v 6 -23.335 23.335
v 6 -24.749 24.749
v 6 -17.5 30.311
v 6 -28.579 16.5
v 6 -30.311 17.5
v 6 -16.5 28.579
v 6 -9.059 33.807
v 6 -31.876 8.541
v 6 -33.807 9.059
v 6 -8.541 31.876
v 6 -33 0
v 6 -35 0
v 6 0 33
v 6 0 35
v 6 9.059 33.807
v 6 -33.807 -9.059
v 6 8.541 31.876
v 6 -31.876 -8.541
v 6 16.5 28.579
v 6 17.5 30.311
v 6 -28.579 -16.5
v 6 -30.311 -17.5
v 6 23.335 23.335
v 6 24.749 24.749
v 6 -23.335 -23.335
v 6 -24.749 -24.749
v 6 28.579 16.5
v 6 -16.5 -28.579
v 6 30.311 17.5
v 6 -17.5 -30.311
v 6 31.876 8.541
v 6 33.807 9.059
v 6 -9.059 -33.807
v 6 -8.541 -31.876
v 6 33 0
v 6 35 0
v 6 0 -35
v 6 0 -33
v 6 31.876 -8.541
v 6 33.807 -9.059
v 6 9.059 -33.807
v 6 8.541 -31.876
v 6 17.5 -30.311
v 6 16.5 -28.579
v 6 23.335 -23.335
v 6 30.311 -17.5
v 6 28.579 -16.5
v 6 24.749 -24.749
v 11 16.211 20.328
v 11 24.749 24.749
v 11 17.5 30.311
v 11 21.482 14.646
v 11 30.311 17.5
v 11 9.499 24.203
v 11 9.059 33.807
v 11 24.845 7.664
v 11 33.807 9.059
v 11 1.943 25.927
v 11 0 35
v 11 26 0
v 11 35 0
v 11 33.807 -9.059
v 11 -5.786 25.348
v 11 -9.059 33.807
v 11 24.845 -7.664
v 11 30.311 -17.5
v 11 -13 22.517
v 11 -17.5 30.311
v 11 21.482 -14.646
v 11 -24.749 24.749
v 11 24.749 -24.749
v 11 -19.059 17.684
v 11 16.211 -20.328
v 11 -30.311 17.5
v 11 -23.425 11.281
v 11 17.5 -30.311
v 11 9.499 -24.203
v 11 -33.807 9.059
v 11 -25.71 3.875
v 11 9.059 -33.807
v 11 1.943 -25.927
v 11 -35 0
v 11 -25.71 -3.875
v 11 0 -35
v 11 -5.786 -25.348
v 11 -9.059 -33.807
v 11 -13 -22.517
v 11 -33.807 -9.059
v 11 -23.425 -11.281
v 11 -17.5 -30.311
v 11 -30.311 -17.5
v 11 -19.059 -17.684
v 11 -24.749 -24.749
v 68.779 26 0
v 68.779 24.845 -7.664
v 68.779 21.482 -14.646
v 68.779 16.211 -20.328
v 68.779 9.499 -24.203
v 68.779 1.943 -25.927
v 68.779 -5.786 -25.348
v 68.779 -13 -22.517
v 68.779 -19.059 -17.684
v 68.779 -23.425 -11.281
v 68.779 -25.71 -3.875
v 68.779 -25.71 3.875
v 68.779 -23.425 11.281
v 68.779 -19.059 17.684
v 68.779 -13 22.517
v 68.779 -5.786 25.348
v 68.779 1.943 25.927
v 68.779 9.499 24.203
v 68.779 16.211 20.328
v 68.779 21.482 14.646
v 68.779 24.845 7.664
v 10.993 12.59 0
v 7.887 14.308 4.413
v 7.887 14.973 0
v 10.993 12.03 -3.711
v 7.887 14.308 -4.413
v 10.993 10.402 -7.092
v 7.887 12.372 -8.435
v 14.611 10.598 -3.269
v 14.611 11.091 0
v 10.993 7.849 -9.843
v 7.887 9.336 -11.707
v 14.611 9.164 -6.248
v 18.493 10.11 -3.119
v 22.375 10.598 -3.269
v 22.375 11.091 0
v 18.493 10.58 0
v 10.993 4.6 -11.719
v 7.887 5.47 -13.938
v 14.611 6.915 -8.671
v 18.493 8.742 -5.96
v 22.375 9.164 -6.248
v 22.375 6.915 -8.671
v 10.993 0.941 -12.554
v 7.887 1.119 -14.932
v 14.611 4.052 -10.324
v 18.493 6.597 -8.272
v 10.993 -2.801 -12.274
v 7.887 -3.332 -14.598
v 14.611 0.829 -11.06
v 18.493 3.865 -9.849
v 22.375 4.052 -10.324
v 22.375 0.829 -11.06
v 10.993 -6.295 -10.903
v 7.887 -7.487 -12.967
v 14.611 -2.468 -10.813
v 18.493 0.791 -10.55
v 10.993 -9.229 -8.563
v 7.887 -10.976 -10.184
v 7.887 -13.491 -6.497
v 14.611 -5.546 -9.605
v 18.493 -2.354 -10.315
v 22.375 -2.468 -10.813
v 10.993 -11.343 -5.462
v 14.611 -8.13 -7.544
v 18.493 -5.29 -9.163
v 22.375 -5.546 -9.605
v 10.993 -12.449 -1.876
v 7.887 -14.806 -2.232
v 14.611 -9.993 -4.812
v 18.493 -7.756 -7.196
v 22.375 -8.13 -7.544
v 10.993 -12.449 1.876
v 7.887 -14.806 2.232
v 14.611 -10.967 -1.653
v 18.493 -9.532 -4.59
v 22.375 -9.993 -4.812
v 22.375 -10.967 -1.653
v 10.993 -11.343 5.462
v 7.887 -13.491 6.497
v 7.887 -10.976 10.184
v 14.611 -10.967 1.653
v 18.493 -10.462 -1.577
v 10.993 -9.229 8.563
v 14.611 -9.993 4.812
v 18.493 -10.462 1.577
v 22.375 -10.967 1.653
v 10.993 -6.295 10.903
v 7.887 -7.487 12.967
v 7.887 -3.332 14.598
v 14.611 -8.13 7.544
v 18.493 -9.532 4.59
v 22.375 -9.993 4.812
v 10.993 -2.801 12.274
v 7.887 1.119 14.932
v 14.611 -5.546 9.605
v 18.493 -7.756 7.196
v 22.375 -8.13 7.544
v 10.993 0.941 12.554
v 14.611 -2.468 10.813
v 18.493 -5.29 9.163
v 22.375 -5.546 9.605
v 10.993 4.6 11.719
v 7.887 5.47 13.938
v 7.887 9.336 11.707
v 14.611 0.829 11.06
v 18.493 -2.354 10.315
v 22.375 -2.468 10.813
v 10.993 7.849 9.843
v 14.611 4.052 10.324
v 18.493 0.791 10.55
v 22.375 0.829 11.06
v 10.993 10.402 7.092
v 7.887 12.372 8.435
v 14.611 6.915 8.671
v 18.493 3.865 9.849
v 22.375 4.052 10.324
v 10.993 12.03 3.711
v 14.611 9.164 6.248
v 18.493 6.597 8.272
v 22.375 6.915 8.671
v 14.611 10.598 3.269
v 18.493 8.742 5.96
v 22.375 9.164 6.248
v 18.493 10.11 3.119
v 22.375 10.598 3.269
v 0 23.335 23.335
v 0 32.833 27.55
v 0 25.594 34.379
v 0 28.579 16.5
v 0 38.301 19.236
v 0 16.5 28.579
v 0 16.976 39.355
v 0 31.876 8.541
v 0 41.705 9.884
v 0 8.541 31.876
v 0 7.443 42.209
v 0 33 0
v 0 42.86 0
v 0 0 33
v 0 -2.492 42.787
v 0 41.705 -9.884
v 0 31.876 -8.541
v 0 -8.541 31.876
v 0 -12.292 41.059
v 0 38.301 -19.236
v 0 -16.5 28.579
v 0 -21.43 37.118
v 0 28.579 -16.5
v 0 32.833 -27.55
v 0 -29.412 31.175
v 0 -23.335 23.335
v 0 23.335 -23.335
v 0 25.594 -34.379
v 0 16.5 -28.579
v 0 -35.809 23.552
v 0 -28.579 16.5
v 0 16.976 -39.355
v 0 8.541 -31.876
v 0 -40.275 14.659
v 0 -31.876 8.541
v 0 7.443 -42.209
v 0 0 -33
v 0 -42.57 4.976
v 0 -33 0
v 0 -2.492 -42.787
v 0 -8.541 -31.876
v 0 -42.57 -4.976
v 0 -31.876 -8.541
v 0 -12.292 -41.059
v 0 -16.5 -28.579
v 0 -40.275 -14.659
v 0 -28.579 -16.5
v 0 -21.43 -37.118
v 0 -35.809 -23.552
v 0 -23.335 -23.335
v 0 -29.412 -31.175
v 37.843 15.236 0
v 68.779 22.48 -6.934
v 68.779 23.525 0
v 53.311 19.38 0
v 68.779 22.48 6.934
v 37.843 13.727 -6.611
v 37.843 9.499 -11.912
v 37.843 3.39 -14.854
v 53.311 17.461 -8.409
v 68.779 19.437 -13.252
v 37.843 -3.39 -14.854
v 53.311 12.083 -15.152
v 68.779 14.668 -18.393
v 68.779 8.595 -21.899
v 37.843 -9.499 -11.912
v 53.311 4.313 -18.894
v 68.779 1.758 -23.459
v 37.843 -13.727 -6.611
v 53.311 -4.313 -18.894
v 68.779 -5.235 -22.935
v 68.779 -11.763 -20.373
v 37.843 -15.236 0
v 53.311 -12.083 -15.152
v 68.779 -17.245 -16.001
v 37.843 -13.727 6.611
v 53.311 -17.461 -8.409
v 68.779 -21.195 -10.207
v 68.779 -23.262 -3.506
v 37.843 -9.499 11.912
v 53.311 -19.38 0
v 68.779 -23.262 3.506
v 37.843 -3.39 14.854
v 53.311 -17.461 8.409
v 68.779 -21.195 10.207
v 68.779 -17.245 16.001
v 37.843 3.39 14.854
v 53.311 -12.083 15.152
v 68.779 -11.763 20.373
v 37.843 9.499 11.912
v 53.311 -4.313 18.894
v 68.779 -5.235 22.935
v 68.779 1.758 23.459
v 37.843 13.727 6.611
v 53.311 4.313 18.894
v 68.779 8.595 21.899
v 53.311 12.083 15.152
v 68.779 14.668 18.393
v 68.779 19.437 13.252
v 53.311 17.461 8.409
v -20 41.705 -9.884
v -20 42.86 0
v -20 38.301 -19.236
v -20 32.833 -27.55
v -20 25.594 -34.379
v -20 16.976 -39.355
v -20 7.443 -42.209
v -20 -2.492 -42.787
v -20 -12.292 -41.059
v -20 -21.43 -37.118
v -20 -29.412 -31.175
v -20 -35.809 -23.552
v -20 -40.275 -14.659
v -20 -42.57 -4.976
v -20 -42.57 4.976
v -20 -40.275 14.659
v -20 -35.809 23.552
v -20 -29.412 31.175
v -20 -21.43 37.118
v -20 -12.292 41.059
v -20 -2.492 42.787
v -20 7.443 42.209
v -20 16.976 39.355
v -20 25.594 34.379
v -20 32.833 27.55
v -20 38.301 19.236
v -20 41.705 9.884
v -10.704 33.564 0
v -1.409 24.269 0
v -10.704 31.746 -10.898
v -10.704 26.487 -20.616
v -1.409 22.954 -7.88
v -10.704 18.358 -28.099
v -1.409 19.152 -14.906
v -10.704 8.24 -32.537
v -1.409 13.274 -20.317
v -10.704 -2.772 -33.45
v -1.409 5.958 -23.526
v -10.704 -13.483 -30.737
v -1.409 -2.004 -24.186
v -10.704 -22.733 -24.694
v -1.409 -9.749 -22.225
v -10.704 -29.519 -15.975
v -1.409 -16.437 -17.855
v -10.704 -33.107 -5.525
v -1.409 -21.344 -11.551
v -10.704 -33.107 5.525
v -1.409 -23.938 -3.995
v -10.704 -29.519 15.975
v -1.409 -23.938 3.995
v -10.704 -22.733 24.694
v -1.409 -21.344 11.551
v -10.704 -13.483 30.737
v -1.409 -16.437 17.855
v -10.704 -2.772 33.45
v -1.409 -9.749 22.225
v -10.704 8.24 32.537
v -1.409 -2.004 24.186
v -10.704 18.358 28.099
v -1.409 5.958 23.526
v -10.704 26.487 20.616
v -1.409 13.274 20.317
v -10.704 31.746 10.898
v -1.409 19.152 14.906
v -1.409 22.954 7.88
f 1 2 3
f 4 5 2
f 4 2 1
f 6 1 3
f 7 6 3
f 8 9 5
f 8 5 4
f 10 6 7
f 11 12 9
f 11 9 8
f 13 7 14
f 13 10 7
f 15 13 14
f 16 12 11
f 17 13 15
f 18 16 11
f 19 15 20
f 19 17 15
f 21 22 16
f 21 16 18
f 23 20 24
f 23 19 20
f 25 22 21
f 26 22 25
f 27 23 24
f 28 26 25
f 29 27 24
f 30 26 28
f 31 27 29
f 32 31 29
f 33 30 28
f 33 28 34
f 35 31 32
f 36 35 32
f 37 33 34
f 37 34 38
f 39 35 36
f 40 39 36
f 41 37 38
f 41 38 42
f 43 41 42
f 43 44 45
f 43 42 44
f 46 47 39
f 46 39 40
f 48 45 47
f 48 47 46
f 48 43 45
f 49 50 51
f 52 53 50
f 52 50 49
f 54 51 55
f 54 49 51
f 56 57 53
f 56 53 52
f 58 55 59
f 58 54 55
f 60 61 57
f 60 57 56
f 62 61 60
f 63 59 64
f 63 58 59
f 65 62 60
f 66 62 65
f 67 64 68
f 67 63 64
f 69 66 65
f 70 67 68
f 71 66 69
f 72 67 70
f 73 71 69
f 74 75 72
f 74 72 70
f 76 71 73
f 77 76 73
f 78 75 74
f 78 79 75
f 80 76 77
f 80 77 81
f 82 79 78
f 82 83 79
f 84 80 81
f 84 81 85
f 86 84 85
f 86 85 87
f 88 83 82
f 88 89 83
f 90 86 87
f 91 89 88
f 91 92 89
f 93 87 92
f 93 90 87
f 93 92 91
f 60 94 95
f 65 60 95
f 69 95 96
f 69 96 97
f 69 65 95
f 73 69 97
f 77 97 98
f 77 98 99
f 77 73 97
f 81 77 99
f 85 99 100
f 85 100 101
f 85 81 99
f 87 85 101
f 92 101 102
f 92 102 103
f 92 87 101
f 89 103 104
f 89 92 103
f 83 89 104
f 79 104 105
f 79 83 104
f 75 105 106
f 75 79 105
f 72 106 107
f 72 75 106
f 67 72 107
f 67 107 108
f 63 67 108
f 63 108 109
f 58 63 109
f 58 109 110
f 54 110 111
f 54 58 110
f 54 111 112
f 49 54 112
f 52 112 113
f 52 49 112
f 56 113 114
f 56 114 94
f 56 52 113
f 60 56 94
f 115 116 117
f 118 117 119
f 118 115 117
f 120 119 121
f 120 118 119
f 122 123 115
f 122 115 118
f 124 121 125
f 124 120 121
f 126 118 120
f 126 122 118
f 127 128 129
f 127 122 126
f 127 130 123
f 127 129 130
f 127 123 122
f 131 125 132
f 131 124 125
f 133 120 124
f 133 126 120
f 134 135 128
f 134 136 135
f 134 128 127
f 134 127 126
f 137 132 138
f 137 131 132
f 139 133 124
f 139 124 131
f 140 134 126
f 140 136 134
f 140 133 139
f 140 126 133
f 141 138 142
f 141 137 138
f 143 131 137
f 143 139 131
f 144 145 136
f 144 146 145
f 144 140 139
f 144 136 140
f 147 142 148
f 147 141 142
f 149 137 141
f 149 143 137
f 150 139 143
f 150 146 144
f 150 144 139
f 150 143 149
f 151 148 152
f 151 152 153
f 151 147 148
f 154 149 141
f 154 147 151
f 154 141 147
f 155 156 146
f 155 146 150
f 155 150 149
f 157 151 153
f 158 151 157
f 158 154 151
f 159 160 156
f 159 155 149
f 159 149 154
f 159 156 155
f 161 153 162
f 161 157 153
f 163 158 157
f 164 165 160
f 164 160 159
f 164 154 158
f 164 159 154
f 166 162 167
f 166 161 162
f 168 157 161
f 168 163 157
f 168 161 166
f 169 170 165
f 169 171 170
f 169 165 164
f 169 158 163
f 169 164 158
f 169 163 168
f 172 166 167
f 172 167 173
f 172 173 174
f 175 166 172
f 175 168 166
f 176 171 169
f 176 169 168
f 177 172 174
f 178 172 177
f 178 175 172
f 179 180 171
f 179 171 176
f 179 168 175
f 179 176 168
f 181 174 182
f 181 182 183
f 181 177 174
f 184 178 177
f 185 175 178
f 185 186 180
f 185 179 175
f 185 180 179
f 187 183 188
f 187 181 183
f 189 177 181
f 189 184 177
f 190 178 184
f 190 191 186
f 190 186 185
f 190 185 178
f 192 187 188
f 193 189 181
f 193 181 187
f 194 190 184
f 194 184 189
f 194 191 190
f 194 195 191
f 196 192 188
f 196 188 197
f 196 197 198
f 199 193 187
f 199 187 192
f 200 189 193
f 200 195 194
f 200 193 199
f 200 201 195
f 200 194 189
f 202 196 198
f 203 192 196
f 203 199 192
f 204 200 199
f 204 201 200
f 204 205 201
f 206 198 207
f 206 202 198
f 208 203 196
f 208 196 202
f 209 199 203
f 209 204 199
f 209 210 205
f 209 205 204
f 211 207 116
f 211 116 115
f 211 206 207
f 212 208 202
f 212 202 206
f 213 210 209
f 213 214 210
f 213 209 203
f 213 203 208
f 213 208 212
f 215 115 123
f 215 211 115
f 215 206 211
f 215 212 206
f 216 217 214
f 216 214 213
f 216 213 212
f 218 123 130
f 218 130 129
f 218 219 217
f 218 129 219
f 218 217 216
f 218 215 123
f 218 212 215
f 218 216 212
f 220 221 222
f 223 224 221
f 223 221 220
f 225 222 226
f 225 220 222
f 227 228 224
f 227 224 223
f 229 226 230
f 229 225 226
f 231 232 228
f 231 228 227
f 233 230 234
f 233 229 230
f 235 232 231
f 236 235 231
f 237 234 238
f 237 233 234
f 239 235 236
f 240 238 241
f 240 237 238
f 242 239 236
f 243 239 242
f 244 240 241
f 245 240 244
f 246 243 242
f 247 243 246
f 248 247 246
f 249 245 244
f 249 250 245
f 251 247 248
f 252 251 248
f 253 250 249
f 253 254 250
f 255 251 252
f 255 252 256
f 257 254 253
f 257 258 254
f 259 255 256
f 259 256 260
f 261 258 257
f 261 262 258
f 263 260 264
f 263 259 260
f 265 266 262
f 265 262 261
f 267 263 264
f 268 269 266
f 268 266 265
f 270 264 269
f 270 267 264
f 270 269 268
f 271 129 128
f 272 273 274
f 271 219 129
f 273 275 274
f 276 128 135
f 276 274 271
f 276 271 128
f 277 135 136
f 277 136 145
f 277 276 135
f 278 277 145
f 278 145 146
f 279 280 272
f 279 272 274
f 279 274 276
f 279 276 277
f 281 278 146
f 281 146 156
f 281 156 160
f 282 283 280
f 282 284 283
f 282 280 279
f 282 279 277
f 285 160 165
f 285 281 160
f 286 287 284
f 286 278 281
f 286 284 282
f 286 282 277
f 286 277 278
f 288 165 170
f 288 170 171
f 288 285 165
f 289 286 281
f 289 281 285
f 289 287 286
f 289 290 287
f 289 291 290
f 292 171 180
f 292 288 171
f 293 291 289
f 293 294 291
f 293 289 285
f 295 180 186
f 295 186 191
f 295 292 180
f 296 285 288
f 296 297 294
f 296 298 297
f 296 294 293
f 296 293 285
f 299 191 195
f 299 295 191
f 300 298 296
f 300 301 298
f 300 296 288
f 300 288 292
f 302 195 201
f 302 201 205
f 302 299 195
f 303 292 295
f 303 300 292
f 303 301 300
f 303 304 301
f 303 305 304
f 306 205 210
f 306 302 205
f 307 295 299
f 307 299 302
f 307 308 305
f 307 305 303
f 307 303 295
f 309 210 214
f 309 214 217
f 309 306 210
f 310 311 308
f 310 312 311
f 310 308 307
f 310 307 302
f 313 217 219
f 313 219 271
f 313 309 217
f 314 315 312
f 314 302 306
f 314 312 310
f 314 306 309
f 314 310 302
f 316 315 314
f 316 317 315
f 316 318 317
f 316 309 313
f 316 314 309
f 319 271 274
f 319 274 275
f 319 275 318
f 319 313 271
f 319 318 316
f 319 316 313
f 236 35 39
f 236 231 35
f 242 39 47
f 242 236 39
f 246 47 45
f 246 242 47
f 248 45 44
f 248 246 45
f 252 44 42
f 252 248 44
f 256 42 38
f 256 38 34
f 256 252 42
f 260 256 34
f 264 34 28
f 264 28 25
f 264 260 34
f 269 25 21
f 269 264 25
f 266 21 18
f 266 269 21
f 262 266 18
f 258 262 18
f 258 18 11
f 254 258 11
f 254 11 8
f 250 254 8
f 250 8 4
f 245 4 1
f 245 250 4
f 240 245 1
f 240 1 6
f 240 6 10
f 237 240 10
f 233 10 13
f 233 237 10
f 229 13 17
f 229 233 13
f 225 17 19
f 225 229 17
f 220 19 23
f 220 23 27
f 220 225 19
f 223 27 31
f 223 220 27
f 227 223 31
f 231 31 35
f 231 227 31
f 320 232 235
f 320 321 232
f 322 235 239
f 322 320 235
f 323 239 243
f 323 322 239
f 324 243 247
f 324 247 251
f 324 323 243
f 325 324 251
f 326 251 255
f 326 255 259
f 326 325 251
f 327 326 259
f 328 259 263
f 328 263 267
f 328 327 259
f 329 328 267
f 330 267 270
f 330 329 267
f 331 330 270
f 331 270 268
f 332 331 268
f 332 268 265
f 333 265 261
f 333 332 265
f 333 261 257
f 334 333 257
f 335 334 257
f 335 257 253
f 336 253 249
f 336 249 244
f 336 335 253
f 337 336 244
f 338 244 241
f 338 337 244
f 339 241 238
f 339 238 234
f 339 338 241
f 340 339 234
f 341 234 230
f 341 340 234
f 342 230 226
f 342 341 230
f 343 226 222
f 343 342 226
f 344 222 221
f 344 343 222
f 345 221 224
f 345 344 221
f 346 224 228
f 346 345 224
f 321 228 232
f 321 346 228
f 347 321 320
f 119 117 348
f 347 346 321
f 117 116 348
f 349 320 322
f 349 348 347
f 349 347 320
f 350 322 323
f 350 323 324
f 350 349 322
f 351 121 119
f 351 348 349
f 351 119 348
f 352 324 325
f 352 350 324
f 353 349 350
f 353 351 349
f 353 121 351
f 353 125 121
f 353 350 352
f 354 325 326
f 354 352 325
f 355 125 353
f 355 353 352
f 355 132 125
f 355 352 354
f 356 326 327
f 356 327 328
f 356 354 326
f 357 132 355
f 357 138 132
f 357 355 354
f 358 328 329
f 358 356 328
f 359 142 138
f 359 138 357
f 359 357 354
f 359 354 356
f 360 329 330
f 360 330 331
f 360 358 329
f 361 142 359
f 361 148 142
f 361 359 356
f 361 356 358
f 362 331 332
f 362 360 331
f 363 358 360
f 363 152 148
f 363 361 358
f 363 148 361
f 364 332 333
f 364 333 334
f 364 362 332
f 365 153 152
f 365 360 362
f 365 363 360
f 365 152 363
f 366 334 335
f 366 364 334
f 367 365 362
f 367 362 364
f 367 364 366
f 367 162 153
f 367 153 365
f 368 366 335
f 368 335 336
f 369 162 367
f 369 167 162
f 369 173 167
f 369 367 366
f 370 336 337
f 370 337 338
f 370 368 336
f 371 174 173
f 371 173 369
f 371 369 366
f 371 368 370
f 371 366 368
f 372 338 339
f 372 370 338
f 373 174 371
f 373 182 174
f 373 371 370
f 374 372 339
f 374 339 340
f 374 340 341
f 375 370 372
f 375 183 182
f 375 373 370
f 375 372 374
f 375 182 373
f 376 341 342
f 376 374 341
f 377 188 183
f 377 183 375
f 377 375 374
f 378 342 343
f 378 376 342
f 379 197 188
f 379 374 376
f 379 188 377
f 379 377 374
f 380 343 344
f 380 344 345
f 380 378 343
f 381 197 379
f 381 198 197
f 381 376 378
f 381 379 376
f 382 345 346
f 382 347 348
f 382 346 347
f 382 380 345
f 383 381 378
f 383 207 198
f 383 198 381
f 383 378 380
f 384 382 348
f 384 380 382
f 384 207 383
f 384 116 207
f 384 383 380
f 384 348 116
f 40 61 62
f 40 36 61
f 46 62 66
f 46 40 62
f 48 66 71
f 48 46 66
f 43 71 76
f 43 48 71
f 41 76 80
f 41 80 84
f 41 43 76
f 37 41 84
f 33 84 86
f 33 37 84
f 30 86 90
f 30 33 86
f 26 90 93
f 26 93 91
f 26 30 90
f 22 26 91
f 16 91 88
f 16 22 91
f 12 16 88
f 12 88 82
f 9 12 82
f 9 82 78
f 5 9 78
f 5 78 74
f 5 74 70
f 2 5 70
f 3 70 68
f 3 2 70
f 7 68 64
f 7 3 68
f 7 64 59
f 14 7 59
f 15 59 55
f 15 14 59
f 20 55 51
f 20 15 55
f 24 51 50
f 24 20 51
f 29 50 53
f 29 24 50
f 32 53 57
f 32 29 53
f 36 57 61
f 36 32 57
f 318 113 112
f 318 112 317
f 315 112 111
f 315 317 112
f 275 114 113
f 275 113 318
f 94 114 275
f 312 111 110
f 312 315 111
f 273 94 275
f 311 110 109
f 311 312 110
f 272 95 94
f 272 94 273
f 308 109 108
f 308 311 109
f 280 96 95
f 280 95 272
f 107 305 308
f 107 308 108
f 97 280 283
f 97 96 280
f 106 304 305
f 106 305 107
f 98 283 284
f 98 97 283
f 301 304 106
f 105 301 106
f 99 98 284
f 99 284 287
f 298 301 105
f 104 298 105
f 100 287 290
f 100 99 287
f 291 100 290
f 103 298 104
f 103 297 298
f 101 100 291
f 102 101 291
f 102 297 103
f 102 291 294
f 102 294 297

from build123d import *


with BuildPart() as part:
    # Sketch1 → Revolve1 (revolve)
    with BuildSketch(Plane.XY):
        with BuildLine():
            Line((-20, 42.86), (7.886601718, 14.973398282))
            ThreePointArc((7.886601718, 14.973398282), (14.610917759, 11.091112606), (22.375489112, 11.091112606))
            Line((22.375489112, 11.091112606), (68.779388603, 23.525))
            Line((68.779388603, 23.525), (68.779388603, 26))
            Line((68.779388603, 26), (11, 26))
            Line((11, 26), (11, 35))
            Line((11, 35), (6, 35))
            Line((6, 35), (6, 33))
            Line((6, 33), (0, 33))
            Line((0, 33), (0, 42.86))
            Line((0, 42.86), (-20, 42.86))
        make_face()
    revolve(axis=Axis((0, 0, 0), (-1, 0, 0)))


solid = part.part
